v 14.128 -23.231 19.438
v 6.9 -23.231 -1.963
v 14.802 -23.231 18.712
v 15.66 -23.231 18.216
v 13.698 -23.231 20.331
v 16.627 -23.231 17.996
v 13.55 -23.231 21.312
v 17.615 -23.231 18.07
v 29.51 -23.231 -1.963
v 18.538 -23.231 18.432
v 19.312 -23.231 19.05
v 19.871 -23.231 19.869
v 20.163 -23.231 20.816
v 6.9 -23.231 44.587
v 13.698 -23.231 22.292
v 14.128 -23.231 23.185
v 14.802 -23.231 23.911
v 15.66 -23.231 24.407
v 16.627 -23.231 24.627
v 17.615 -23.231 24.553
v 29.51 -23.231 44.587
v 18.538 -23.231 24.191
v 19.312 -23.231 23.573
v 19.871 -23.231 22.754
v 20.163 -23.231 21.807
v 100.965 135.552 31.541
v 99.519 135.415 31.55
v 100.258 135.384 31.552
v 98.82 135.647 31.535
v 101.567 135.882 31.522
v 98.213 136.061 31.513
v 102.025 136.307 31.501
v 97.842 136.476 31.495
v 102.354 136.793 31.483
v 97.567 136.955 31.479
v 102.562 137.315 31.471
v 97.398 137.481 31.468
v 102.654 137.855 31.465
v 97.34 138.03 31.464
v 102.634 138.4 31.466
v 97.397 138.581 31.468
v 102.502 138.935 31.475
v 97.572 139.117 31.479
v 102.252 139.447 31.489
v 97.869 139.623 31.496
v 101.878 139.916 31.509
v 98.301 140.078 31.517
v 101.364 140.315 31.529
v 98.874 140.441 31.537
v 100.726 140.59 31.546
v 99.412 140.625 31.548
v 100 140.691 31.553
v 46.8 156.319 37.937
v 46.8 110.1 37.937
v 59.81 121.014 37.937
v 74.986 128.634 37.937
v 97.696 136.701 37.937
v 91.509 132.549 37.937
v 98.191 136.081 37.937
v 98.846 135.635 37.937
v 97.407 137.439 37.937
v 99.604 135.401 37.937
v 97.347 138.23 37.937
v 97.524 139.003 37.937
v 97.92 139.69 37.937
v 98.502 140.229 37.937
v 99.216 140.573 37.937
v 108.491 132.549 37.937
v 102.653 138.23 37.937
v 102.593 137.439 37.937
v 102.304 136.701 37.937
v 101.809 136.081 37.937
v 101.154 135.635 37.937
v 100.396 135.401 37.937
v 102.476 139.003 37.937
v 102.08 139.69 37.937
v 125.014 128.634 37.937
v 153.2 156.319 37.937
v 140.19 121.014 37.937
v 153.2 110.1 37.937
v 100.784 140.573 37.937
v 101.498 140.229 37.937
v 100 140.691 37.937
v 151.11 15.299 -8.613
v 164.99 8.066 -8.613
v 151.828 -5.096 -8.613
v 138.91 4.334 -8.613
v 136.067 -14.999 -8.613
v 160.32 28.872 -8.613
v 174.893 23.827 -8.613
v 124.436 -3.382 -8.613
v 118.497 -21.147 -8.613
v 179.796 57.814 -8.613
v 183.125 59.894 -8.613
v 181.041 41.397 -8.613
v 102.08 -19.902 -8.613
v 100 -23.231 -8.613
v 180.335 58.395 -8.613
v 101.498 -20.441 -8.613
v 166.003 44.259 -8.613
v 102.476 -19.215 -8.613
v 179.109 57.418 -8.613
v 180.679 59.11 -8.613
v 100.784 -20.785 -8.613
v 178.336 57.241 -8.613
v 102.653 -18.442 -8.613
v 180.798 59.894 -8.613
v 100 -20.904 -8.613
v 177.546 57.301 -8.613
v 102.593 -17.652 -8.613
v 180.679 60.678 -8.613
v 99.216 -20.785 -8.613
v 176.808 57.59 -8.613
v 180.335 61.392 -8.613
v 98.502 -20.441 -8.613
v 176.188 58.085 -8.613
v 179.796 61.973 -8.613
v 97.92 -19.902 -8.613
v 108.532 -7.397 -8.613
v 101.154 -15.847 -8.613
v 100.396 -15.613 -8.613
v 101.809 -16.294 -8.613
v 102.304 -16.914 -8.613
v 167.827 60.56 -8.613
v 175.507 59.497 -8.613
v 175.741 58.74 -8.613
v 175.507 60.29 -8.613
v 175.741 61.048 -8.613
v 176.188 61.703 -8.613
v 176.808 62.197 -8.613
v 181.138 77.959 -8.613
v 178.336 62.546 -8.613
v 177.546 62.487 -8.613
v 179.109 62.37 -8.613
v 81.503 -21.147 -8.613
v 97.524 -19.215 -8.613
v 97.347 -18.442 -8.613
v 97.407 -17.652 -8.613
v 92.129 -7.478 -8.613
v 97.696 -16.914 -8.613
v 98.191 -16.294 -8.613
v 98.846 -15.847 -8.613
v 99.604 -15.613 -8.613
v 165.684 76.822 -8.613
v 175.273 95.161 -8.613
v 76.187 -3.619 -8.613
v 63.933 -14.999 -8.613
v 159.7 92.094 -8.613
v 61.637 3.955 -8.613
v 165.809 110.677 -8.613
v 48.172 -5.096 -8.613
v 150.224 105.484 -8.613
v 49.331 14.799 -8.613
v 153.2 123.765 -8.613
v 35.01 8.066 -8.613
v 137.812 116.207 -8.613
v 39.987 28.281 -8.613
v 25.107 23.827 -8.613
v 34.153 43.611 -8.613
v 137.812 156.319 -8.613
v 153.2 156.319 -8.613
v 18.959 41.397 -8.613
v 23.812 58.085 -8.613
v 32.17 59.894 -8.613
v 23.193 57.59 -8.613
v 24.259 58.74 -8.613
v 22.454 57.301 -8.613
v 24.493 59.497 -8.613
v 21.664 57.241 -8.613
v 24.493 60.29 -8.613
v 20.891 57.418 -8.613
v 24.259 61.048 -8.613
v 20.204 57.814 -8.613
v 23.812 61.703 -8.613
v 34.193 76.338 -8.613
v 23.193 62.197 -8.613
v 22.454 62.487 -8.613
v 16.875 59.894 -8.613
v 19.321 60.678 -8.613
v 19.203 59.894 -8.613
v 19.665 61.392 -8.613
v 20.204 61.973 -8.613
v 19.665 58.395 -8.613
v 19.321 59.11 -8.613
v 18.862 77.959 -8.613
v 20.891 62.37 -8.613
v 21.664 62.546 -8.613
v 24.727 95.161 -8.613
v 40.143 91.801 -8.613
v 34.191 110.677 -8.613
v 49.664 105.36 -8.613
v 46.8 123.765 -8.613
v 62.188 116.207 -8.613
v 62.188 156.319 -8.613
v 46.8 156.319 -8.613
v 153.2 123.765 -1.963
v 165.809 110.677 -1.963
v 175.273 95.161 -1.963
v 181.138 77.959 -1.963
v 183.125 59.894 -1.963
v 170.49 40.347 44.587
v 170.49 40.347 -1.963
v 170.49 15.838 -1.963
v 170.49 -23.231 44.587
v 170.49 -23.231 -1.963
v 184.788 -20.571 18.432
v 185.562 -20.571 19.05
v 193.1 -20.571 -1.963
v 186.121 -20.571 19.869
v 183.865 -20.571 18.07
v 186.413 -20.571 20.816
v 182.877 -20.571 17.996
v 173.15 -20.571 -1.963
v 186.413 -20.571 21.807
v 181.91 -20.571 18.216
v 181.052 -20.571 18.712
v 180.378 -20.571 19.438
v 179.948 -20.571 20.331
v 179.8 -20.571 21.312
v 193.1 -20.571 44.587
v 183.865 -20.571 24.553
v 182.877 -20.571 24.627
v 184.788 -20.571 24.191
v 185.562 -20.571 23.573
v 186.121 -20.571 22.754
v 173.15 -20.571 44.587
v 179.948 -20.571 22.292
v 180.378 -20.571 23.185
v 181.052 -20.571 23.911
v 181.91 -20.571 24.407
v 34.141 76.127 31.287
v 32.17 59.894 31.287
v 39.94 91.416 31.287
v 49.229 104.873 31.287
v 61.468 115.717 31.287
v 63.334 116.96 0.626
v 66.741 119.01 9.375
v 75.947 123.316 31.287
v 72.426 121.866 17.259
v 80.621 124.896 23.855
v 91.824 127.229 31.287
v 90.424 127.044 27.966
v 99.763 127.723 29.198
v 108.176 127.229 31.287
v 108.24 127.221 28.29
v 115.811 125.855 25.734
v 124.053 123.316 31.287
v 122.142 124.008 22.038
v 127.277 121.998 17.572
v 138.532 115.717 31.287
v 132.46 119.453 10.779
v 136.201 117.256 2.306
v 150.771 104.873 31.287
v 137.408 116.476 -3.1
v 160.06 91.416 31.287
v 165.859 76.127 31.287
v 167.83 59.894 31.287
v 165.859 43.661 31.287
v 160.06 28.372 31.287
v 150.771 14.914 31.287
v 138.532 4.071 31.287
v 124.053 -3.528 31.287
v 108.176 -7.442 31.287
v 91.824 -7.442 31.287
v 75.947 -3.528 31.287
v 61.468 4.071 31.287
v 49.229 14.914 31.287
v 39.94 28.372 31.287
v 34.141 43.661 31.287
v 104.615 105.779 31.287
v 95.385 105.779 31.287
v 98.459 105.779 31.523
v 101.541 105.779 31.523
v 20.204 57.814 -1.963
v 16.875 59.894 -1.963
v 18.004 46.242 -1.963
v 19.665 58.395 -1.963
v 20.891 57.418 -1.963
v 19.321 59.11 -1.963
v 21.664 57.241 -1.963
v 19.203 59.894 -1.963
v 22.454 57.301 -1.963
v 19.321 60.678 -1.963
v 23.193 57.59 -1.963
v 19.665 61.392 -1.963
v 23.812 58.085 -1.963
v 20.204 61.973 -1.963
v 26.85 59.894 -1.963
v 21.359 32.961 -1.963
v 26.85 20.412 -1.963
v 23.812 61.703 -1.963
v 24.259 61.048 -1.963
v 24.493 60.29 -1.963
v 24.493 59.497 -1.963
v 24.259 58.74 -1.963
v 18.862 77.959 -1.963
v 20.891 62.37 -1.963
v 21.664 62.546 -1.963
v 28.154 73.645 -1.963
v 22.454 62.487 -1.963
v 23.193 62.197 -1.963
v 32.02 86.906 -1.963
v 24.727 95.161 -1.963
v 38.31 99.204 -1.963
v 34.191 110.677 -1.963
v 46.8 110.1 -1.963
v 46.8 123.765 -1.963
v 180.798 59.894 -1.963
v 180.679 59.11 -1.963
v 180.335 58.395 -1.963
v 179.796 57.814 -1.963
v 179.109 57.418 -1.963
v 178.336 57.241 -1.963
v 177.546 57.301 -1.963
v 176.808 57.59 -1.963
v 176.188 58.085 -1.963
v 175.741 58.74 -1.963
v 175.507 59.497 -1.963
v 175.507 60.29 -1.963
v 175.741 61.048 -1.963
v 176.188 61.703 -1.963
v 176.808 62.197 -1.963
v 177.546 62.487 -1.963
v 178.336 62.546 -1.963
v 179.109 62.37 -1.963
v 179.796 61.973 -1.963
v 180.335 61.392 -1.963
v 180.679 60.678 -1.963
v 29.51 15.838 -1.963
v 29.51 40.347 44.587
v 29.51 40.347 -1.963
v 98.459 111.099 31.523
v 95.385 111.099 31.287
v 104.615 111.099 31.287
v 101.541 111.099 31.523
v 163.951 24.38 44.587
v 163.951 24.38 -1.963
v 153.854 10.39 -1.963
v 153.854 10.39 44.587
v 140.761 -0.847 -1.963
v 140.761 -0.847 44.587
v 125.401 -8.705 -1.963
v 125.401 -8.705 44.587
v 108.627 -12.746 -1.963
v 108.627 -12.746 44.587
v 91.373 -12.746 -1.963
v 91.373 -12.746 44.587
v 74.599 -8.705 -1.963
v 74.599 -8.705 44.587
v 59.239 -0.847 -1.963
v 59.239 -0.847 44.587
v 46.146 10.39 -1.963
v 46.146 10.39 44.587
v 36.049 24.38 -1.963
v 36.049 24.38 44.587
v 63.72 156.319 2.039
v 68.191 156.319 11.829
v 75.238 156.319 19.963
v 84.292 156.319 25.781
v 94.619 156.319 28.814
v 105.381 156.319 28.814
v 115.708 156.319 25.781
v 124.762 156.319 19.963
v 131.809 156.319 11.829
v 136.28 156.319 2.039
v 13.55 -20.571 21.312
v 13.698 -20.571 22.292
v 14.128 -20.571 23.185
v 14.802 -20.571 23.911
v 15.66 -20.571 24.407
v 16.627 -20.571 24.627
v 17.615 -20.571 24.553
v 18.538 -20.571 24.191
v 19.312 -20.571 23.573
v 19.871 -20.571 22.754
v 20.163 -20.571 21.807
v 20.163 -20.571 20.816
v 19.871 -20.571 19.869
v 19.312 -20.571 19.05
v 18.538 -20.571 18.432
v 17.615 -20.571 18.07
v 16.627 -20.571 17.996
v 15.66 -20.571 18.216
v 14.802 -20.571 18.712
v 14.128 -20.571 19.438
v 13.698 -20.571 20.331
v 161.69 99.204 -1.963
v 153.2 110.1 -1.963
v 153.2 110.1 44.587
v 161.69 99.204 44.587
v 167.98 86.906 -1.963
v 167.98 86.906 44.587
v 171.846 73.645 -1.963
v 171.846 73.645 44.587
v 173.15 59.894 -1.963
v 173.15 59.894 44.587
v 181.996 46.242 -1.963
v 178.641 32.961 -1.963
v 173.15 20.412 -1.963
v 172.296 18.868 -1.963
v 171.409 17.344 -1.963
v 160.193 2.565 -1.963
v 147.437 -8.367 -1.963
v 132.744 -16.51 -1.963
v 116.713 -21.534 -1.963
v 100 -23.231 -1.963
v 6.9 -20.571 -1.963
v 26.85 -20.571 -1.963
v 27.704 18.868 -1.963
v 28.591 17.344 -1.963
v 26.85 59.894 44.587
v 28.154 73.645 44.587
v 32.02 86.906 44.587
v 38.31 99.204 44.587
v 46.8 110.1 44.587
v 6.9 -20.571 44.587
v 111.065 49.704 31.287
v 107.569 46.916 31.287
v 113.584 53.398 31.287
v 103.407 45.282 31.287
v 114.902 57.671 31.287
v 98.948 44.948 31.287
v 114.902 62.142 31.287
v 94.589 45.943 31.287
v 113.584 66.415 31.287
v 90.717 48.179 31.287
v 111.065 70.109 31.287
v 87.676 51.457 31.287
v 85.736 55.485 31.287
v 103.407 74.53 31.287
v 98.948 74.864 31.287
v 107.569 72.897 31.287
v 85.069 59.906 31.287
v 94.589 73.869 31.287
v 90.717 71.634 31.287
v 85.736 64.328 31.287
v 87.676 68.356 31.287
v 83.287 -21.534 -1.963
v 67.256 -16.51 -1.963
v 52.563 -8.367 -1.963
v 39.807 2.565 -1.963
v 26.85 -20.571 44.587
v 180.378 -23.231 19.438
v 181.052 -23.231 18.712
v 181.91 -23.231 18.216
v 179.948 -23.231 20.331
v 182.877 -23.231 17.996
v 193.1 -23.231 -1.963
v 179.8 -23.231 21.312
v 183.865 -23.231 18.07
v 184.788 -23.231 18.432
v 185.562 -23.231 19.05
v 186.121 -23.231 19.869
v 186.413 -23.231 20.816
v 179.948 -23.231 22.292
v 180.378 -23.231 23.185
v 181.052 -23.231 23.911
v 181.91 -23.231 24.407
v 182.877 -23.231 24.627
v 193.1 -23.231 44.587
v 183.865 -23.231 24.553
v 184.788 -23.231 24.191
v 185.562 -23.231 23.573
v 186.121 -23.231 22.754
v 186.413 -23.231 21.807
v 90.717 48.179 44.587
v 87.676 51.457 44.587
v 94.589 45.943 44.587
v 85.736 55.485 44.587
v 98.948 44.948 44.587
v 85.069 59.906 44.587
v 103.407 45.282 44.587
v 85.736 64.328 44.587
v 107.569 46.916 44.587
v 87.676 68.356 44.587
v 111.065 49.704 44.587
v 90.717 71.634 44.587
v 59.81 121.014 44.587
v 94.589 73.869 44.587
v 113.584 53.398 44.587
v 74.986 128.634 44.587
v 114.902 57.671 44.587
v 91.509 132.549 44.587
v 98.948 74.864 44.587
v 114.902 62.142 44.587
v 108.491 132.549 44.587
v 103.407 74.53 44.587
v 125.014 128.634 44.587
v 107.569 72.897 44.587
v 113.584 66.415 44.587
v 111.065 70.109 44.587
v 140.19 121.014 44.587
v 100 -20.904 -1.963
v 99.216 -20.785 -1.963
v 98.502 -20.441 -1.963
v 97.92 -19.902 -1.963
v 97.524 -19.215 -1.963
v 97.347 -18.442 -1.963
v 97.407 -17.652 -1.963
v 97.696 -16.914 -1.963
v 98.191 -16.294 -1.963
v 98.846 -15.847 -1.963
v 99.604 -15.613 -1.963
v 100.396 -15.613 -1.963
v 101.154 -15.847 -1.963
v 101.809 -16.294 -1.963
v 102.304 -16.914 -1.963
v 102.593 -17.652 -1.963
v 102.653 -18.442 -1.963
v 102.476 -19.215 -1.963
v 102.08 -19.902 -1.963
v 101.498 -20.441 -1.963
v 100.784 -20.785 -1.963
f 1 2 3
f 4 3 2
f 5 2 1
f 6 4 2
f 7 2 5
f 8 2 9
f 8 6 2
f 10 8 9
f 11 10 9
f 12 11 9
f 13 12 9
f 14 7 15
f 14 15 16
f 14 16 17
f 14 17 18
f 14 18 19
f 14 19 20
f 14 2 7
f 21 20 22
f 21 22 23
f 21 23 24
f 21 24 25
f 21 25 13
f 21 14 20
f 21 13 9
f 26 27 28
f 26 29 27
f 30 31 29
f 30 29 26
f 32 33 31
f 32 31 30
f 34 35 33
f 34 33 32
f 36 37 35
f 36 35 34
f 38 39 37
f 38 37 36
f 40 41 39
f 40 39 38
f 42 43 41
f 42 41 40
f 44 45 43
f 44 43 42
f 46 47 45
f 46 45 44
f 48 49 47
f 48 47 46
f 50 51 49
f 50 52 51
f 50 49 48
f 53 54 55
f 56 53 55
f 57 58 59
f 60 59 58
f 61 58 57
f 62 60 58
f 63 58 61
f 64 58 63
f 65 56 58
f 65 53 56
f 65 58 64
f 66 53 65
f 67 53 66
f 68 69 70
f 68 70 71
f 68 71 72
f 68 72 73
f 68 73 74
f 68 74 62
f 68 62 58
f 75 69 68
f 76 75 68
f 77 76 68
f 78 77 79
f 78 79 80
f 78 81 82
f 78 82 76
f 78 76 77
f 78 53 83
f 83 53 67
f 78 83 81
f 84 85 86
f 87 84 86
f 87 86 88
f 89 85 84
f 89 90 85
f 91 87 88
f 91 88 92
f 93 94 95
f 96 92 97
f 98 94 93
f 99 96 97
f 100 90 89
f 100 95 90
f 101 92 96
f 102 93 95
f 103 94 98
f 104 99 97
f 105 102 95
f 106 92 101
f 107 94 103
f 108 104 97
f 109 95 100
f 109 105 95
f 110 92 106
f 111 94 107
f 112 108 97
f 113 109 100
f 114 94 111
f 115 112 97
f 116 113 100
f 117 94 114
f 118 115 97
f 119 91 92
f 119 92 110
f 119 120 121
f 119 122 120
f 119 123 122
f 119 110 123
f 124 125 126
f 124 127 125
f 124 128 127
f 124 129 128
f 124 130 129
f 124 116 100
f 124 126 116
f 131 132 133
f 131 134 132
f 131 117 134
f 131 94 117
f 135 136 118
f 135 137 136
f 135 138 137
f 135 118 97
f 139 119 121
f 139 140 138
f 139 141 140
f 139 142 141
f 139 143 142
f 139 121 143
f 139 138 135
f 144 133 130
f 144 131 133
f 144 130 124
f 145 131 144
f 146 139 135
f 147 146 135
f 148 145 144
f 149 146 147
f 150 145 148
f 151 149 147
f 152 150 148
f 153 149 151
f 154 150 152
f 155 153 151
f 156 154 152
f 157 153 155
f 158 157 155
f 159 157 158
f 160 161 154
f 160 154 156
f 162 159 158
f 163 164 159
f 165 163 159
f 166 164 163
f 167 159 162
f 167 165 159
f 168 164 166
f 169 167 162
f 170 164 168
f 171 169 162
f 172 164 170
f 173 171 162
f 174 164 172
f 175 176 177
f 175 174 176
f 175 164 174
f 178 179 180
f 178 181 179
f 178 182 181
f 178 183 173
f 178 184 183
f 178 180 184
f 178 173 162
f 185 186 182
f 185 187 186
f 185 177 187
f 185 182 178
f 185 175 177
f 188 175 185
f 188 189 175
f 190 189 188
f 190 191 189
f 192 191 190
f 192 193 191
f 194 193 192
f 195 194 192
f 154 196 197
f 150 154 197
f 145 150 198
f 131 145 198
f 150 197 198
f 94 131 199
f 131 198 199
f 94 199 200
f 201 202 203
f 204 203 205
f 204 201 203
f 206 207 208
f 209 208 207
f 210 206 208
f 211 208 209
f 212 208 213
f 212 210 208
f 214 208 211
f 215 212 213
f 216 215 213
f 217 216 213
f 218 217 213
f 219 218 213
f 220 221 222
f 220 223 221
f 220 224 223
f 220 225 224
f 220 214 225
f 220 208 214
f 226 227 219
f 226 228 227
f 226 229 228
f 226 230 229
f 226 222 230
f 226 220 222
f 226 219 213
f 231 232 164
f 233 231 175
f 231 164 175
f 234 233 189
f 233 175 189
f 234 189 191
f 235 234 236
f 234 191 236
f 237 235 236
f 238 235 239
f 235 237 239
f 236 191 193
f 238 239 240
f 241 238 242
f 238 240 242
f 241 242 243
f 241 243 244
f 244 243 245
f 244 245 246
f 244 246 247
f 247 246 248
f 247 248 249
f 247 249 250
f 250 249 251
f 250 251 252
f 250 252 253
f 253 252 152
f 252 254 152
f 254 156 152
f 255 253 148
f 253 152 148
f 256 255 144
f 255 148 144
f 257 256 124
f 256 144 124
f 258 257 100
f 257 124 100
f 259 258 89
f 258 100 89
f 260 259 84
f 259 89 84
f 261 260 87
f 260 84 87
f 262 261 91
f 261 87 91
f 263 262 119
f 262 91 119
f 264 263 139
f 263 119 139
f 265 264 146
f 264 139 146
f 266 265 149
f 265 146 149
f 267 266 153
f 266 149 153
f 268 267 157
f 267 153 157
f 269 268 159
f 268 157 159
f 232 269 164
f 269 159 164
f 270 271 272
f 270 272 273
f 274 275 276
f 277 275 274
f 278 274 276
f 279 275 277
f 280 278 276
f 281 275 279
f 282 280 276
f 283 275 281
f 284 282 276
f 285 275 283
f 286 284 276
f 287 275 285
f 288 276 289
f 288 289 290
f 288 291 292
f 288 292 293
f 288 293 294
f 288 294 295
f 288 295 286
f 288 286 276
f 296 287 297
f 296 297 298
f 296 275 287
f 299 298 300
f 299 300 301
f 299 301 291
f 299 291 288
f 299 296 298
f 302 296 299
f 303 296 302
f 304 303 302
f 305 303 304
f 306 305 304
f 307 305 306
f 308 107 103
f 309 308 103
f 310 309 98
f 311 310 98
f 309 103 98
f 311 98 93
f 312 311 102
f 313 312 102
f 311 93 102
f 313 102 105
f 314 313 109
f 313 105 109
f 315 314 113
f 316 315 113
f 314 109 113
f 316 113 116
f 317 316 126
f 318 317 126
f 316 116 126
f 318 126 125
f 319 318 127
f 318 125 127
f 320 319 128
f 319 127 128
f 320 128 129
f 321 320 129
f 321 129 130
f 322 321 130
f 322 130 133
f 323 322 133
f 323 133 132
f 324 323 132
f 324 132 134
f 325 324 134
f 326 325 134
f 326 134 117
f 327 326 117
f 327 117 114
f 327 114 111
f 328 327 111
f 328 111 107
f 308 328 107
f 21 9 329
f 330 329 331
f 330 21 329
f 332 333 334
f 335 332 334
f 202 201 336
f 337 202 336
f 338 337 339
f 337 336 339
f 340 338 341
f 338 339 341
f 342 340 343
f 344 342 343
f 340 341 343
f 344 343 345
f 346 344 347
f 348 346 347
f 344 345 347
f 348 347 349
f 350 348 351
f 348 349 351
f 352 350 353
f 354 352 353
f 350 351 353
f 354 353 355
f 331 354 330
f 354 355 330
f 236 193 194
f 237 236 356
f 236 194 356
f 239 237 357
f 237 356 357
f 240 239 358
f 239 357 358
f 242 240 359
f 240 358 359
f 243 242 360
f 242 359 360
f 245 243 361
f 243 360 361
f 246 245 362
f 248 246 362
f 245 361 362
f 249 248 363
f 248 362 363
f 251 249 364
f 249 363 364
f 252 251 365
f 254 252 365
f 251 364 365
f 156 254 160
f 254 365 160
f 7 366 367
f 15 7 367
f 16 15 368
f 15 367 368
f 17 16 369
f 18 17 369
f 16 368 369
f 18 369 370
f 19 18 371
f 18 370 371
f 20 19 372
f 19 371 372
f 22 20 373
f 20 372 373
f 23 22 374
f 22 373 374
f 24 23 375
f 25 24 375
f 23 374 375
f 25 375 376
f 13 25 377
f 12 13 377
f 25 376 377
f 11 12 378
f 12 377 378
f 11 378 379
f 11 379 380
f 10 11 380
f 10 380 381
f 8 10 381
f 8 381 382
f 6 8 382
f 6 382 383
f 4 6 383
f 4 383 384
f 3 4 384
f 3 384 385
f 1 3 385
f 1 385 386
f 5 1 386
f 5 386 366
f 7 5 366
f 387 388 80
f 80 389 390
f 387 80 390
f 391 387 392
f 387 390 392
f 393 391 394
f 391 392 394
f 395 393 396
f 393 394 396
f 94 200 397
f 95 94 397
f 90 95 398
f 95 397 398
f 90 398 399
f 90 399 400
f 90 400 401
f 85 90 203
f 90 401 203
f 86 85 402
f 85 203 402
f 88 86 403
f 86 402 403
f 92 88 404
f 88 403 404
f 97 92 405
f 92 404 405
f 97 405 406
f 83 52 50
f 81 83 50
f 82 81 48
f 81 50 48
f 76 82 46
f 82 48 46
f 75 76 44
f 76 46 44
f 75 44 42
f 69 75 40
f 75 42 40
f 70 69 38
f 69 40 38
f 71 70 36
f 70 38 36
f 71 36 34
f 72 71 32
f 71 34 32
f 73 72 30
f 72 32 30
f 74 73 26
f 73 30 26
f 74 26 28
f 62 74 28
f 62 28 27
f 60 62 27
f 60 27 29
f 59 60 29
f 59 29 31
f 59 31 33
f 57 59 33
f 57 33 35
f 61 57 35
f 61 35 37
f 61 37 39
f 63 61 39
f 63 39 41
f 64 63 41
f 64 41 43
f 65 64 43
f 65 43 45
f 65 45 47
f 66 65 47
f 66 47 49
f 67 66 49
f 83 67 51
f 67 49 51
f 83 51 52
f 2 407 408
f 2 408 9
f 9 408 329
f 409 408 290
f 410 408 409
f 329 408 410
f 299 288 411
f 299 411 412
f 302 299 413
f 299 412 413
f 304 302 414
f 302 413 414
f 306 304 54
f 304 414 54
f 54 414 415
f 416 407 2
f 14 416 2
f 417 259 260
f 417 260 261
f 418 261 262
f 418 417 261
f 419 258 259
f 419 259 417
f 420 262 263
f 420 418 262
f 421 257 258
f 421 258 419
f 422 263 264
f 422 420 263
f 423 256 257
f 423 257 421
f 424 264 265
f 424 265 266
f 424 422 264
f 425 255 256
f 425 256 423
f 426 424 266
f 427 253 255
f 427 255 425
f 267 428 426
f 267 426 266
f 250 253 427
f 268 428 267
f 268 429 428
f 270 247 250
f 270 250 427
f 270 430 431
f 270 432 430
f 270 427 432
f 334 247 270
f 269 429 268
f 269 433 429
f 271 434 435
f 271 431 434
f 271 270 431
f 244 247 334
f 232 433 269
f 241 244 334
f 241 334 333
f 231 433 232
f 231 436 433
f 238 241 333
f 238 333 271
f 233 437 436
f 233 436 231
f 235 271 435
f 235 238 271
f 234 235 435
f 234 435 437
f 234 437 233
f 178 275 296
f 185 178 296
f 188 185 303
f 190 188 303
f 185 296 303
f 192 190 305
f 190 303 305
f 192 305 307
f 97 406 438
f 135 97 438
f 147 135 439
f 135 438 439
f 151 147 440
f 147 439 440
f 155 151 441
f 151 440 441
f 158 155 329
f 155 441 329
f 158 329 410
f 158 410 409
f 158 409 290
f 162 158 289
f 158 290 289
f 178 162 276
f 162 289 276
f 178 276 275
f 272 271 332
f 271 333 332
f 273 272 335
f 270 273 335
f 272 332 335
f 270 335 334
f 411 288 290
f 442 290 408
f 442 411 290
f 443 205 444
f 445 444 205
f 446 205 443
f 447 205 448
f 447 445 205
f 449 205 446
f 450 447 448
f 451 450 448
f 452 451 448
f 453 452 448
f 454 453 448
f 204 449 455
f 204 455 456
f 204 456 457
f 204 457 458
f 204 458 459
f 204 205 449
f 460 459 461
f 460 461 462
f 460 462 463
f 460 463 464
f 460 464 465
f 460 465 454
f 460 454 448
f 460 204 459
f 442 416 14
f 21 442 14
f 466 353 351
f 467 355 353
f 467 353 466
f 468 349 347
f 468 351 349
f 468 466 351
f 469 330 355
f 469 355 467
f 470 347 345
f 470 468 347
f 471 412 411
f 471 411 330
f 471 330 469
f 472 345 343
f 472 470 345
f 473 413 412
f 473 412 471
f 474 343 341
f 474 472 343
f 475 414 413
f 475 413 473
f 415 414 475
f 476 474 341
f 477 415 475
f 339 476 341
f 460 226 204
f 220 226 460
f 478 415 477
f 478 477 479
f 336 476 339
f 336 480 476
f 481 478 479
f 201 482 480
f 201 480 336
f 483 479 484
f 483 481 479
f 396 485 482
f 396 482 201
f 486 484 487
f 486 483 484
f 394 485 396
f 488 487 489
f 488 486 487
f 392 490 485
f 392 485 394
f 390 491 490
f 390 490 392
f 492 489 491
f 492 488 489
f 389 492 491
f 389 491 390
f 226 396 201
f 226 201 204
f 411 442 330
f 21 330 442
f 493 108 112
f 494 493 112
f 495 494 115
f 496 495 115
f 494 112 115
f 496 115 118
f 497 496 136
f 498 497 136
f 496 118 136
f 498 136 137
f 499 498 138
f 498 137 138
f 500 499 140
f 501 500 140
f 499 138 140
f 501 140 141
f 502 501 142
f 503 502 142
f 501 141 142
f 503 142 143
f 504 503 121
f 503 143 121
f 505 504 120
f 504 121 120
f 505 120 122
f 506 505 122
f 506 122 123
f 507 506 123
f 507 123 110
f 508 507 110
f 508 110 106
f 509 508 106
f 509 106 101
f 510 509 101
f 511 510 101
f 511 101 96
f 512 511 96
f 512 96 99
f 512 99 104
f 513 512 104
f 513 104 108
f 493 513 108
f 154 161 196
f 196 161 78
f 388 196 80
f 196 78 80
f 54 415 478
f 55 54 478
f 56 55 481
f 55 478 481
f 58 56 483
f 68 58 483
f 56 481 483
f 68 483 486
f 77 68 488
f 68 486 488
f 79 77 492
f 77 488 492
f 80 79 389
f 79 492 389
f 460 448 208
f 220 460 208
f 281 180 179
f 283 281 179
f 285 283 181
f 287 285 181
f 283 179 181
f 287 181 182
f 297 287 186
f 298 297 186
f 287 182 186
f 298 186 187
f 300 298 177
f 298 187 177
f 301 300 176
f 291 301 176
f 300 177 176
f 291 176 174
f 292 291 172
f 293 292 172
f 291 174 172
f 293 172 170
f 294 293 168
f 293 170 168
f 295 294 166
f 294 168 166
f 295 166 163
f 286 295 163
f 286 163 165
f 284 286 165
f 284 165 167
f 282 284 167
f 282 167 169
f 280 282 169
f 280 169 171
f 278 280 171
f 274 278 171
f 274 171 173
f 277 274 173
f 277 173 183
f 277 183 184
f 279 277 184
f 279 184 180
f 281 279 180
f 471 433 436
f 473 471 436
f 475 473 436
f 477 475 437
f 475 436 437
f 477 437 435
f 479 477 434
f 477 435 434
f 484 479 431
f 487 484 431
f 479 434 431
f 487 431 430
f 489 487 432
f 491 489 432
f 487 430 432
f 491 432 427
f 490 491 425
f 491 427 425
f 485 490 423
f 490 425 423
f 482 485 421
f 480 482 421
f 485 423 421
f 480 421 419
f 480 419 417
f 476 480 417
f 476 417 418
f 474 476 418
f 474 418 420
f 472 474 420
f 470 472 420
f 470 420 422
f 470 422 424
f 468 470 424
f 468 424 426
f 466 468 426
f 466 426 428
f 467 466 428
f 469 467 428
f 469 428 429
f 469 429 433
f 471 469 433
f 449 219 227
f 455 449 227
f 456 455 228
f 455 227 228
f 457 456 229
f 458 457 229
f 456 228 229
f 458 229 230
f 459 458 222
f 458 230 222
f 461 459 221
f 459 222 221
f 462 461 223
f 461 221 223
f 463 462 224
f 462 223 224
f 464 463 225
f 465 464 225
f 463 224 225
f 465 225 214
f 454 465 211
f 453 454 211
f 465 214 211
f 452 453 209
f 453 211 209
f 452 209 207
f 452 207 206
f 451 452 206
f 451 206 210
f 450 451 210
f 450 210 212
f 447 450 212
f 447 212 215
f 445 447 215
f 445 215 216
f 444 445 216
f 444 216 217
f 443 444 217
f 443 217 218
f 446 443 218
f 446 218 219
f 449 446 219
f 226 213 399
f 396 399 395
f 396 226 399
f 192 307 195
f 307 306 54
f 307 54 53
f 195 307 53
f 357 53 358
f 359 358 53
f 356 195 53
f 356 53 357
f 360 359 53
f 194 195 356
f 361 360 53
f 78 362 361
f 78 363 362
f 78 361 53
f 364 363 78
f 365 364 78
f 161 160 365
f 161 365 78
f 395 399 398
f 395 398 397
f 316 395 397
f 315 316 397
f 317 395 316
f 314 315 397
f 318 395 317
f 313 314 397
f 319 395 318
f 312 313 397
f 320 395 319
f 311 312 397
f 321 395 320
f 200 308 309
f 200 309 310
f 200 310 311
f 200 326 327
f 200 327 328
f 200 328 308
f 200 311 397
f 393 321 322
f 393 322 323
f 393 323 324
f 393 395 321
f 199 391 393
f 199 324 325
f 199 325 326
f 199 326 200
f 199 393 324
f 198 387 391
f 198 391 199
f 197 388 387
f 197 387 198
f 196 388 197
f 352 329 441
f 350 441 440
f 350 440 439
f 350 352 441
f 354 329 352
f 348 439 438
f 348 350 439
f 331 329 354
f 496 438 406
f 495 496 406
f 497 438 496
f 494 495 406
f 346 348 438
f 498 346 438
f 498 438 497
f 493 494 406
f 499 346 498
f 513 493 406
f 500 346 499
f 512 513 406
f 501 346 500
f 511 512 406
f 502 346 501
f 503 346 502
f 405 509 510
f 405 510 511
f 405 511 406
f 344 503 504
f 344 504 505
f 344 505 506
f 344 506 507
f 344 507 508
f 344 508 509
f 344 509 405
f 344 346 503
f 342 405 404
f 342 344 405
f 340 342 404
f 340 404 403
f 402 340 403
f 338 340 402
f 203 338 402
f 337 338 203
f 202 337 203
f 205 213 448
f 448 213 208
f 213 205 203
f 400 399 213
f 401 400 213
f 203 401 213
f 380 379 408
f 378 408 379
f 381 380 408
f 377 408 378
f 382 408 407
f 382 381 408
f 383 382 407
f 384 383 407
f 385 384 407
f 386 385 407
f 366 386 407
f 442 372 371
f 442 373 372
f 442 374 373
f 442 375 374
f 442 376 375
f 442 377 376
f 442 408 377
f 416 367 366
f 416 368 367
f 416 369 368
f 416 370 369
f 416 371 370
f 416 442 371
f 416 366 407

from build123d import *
from OCP.BRepAlgoAPI import BRepAlgoAPI_Cut
from OCP.TopTools import TopTools_ListOfShape

# Parameters (mm, degrees)
SKETCH1_W           = 200
SKETCH1_H           = 135
BOSS_EXTRUDE1_DEPTH = 40
CUT_EXTRUDE2_DEPTH  = 40
CUT_EXTRUDE3_DEPTH  = 35
CUT_EXTRUDE4_DEPTH  = 5
SKETCH9_R           = 50
CUT_EXTRUDE5_DEPTH  = 28.2
BOSS_EXTRUDE2_DEPTH = 35
CUT_EXTRUDE6_DEPTH  = 35
SKETCH15_R          = 2
CUT_EXTRUDE8_DEPTH  = 35
CIRPATTERN1_COUNT   = 4
SKETCH16_R          = 2.5
CUT_EXTRUDE9_DEPTH  = 35
SKETCH17_R          = 30.2
CUT_EXTRUDE10_DEPTH = 38
BOSS_EXTRUDE3_DEPTH = 34
SKETCH19_R          = 28.43
CUT_EXTRUDE11_DEPTH = 41
SKETCH20_R          = 51
CUT_EXTRUDE12_DEPTH = 30
SCALE6_SCALE        = 1.33
SKETCH23_R          = 15
CUT_EXTRUDE15_DEPTH = 252.625115315


with BuildPart() as part:
    # Sketch1 → Boss-Extrude1 (new body)
    with BuildSketch(Plane.XY):
        with Locations((100, 67.5)):
            Rectangle(SKETCH1_W, SKETCH1_H)
    extrude(amount=BOSS_EXTRUDE1_DEPTH)

    # Sketch6 → Cut-Extrude2 (cut)
    with BuildSketch(Plane.XY.offset(40)):
        with BuildLine():
            Line((0, 0), (100, 0))
            ThreePointArc((100, 0), (41.230473516, 41.230473516), (60, 110.523431781))
            Line((60, 110.523431781), (60, 135))
            Line((60, 135), (0, 135))
            Line((0, 135), (0, 0))
        make_face()
        with BuildLine():
            ThreePointArc((140, 110.523431781), (158.769526484, 41.230473516), (100, 0))
            Line((100, 0), (200, 0))
            Line((200, 0), (200, 135))
            Line((200, 135), (140, 135))
            Line((140, 135), (140, 110.523431781))
        make_face()
    extrude(amount=-CUT_EXTRUDE2_DEPTH, mode=Mode.SUBTRACT)

    # Sketch7 → Cut-Extrude3 (cut)
    with BuildSketch(Plane.XY.offset(40)):
        with BuildLine():
            ThreePointArc((155, 62.5), (79.689903988, 11.387379249), (60, 100.249172176))
            Line((60, 100.249172176), (60, 110.523431781))
            ThreePointArc((60, 110.523431781), (100, 0), (140, 110.523431781))
            Line((140, 110.523431781), (140, 100.249172176))
            ThreePointArc((140, 100.249172176), (151.112620751, 82.810096012), (155, 62.5))
        make_face()
    extrude(amount=-CUT_EXTRUDE3_DEPTH, mode=Mode.SUBTRACT)

    # Sketch8 → Cut-Extrude4 (cut)
    with BuildSketch(Plane.XY.offset(40)):
        with BuildLine():
            Line((60, 135), (60, 100.249172176))
            ThreePointArc((60, 100.249172176), (100, 117.5), (140, 100.249172176))
            Line((140, 100.249172176), (140, 135))
            Line((140, 135), (60, 135))
        make_face()
    extrude(amount=-CUT_EXTRUDE4_DEPTH, mode=Mode.SUBTRACT)

    # Sketch9 → Cut-Extrude5 (cut)
    with BuildSketch(Plane(origin=(0, 0, 0), x_dir=(-1, 0, 0), z_dir=(0, 0, -1))):
        with Locations((-100, 62.5)):
            Circle(SKETCH9_R)
    extrude(amount=-CUT_EXTRUDE5_DEPTH, mode=Mode.SUBTRACT)

    # Sketch10 → Boss-Extrude2 (add)
    with BuildSketch(Plane.XY.offset(40)):
        with BuildLine():
            Line((155, 2), (155, 62.5))
            ThreePointArc((155, 62.5), (154.497706374, 55.083801513), (153, 47.803061543))
            Line((153, 47.803061543), (153, 0))
            Line((153, 0), (170, 0))
            Line((170, 0), (170, 2))
            Line((170, 2), (155, 2))
        make_face()
        with BuildLine():
            ThreePointArc((47, 47.803061543), (45.502293626, 55.083801513), (45, 62.5))
            Line((45, 62.5), (45, 2))
            Line((45, 2), (30, 2))
            Line((30, 2), (30, 0))
            Line((30, 0), (47, 0))
            Line((47, 0), (47, 47.803061543))
        make_face()
    extrude(amount=-BOSS_EXTRUDE2_DEPTH)

    # Sketch12 → Cut-Extrude6 (cut)
    with BuildSketch(Plane(origin=(0, 135, 0), x_dir=(1, 0, 0), z_dir=(0, 1, 0))):
        with BuildLine():
            ThreePointArc((71.8, 0), (100, -28.2), (128.2, 0))
            Line((128.2, 0), (71.8, 0))
        make_face()
    extrude(amount=-CUT_EXTRUDE6_DEPTH, mode=Mode.SUBTRACT)

    # Sketch15 → Cut-Extrude8 (cut)
    with BuildSketch(Plane(origin=(0, 0, 0), x_dir=(-1, 0, 0), z_dir=(0, 0, -1))):
        with Locations((-41.25, 62.5)):
            Circle(SKETCH15_R)
    cut_extrude8 = extrude(amount=-CUT_EXTRUDE8_DEPTH, mode=Mode.SUBTRACT)

    # CirPattern1: Cut-Extrude8 ×4 about axis
    cirpattern1_axis = Axis((100, 62.5, 5), (0, 0, 1))
    for i in range(1, CIRPATTERN1_COUNT):
        add(cut_extrude8.rotate(cirpattern1_axis, i * 360 / CIRPATTERN1_COUNT), mode=Mode.SUBTRACT)

    # Sketch16 → Cut-Extrude9 (cut)
    with BuildSketch(Plane(origin=(0, 2, 0), x_dir=(1, 0, 0), z_dir=(0, 1, 0))):
        with Locations((162.5, -22.5)):
            Circle(SKETCH16_R)
        with Locations((37.5, -22.5)):
            Circle(SKETCH16_R)
    extrude(amount=-CUT_EXTRUDE9_DEPTH, mode=Mode.SUBTRACT)

    # Sketch17 → Cut-Extrude10 (cut)
    with BuildSketch(Plane(origin=(0, 135, 0), x_dir=(1, 0, 0), z_dir=(0, 1, 0))):
        with Locations((100, 0)):
            Circle(SKETCH17_R)
    extrude(amount=-CUT_EXTRUDE10_DEPTH, mode=Mode.SUBTRACT)

    # Sketch18 → Boss-Extrude3 (add)
    with BuildSketch(Plane(origin=(0, 135, 0), x_dir=(1, 0, 0), z_dir=(0, 1, 0))):
        with BuildLine():
            Line((130.2, 0), (69.8, 0))
            ThreePointArc((69.8, 0), (100, -30.2), (130.2, 0))
        make_face()
    extrude(amount=-BOSS_EXTRUDE3_DEPTH)

    # Sketch19 → Cut-Extrude11 (cut)
    with BuildSketch(Plane(origin=(0, 135, 0), x_dir=(1, 0, 0), z_dir=(0, 1, 0))):
        with Locations((100, 0)):
            Circle(SKETCH19_R)
    extrude(amount=-CUT_EXTRUDE11_DEPTH, mode=Mode.SUBTRACT)

    # Sketch20 → Cut-Extrude12 (cut)
    with BuildSketch(Plane(origin=(0, 0, 0), x_dir=(-1, 0, 0), z_dir=(0, 0, -1))):
        with Locations((-100, 62.5)):
            Circle(SKETCH20_R)
    extrude(amount=-CUT_EXTRUDE12_DEPTH, mode=Mode.SUBTRACT)


with BuildPart() as part_1:
    # Scale6: scaled about (99.999974033, 70.397501302, 26.101442821)
    add(part.part.scale(SCALE6_SCALE).moved(Location((-32.999991431, -23.23117543, -8.613476131))))


with BuildPart() as cut_extrude15_tool:
    # Sketch23 → Cut-Extrude15 (new, through all)
    with BuildSketch(Plane(origin=(0, 0, 31.286528804), x_dir=(-1, 0, 0), z_dir=(0, 0, -1))):
        with Locations((-100.069201604, 59.906371454)):
            Circle(SKETCH23_R)
    extrude(amount=-CUT_EXTRUDE15_DEPTH)


with BuildPart() as part_2:
    add(part_1.part)

    # Cut-Extrude15: cut by cut_extrude15_tool, with a tolerance
    cut_extrude15_stock = TopTools_ListOfShape()
    cut_extrude15_stock.Append(part_2.part.wrapped)
    cut_extrude15_tools = TopTools_ListOfShape()
    cut_extrude15_tools.Append(cut_extrude15_tool.part.wrapped)
    cut_extrude15_cut = BRepAlgoAPI_Cut()
    cut_extrude15_cut.SetArguments(cut_extrude15_stock)
    cut_extrude15_cut.SetTools(cut_extrude15_tools)
    cut_extrude15_cut.SetFuzzyValue(0.00001)
    cut_extrude15_cut.Build()
    add(Compound.cast(cut_extrude15_cut.Shape()).solids(), mode=Mode.REPLACE)


solid = part_2.part
